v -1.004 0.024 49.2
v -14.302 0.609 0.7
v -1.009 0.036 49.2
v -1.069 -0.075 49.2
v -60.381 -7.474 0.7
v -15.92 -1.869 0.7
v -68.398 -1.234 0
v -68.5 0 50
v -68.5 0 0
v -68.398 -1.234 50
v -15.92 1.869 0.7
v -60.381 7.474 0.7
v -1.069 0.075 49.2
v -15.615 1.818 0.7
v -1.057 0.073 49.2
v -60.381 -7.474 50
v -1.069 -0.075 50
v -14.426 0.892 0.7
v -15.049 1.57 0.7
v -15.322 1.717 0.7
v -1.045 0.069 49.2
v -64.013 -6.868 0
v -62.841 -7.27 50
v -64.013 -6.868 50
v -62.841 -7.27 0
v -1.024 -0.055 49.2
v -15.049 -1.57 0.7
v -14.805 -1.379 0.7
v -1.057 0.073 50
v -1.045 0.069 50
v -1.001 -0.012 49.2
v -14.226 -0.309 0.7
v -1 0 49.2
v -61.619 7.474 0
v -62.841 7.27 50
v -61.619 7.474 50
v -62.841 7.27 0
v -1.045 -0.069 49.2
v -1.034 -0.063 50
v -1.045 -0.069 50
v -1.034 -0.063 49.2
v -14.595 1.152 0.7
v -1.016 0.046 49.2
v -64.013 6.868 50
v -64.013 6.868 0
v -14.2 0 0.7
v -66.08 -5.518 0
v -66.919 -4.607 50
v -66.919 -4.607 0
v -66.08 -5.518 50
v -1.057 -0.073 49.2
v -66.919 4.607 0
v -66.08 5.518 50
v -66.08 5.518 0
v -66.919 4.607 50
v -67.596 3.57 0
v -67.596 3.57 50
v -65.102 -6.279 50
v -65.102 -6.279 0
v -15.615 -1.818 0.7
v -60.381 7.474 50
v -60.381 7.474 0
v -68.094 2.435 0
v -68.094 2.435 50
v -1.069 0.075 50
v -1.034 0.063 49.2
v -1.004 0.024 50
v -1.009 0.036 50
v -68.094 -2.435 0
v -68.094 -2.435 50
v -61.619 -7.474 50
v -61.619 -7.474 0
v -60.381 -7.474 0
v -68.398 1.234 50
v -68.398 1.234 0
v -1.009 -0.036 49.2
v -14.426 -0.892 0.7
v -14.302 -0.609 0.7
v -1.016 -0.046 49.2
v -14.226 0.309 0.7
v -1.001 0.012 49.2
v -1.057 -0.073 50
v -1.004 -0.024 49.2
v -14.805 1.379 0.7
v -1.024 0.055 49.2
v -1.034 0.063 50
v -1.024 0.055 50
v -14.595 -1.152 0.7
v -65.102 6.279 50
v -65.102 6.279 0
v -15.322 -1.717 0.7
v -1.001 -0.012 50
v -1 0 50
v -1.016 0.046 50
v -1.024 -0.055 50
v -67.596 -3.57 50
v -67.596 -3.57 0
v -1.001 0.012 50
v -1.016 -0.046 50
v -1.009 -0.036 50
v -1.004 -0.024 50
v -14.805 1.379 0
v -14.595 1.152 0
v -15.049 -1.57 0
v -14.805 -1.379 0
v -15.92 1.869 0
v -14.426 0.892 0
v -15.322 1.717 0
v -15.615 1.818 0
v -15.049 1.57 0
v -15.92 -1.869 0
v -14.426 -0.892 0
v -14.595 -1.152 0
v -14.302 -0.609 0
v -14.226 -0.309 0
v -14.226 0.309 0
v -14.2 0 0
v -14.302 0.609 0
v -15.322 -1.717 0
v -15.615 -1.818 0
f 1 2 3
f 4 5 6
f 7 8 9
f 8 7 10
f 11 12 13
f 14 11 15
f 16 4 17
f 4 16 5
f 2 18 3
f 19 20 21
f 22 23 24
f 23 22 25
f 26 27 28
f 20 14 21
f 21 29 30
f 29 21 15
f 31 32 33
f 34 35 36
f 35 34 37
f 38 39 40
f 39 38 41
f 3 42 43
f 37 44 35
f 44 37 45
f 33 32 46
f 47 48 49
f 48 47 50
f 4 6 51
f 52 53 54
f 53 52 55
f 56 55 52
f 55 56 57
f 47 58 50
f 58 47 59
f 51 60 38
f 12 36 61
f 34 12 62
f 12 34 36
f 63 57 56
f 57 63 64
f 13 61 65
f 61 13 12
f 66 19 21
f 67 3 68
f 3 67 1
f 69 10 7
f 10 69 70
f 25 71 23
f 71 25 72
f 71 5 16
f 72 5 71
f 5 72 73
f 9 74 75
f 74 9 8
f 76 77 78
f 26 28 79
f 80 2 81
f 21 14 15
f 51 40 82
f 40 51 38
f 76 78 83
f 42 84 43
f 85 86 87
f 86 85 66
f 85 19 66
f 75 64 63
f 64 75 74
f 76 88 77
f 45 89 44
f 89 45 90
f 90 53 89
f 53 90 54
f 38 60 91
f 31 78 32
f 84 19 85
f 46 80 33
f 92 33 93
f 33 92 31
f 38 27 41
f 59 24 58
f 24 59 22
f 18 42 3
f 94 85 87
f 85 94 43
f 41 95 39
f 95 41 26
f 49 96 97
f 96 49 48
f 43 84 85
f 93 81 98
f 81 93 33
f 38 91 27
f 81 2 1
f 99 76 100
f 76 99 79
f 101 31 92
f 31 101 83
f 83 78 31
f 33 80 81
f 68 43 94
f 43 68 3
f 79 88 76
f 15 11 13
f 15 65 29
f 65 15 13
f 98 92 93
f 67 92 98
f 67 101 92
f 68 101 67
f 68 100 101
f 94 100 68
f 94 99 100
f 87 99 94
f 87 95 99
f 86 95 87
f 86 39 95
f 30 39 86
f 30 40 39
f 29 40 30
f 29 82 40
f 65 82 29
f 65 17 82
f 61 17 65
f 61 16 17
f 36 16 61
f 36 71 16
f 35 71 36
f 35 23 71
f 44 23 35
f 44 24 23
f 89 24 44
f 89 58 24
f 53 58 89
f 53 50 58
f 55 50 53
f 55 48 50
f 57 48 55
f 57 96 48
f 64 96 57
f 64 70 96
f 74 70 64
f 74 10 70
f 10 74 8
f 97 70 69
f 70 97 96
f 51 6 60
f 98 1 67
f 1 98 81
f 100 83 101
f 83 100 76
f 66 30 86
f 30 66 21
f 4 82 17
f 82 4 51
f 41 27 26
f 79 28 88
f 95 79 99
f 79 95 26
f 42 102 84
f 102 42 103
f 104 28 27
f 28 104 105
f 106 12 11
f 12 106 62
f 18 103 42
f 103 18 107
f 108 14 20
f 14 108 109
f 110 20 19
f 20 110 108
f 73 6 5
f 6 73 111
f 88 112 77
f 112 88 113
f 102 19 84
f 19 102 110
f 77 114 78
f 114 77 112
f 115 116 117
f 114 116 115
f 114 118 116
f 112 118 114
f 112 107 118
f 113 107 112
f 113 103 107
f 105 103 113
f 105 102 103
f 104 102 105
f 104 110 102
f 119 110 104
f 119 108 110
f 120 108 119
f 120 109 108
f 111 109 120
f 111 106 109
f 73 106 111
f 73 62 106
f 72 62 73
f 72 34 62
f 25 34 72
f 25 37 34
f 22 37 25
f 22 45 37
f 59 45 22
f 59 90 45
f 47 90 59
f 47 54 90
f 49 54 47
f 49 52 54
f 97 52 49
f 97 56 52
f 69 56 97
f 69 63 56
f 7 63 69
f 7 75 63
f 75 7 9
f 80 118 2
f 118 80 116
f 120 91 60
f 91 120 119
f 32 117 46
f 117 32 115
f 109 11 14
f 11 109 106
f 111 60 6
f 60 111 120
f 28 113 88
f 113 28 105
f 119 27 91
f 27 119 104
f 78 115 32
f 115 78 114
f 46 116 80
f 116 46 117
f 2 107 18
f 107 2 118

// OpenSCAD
$fn=38;   


height=50;
spout_troat_from_top=.97;
spout_radious_by_diameter=0.01;
diameter=15;
divisions=1;
wall_thicknesss=.8;
dividers_pullback=2;
 spout_push_out=8;
 
for(xr=[0:14.5:80*0])
   color((rndc()+[1,1,1])*.5)   rotate(xr)
 translate([-spout_push_out*diameter/2-1,0,0]) makecup(height,spout_troat_from_top,spout_radious_by_diameter,diameter,divisions,wall_thicknesss,dividers_pullback,spout_push_out);
 {

}

module makecup(
h=50,
pip=.6,
pipr=.5,
dia=40,
div=5,
wall=1,dividers_pullback,spout_push_out){
 union()
*translate([0,0,h])mirror([0,0,1])   linear_extrude(h*0.15) union(){
rotate(60) translate([-diameter*0.5-wall*2.71,0,0]) 
  offset(-wall*.2)  union(){
    difference(){ union(){
    circle(wall*2);  
    
       rotate(-45) {
          hull(){ square([wall*2,wall*2]); 
        rotate(-15) translate([wall*2,wall*2])   circle(wall*1. );  
        rotate(15) translate([wall*2,wall*2])   circle(wall*1. );  
       }
           }  }
           
    circle(wall*.5);  

    }     }
    ;
   
rotate(-60)  translate([-diameter*0.5-wall*2.71,0,0]){  
   offset( wall*.2)    offset(-wall*.1)    offset(-wall*.1)   difference(){ circle(wall*3);
 circle(wall*2);  
   rotate(60)   square([wall*3,wall*3]); 
   }}}
difference()
{

 connect(h,pip,pipr,dia,div,wall){
translate([0,0,h-wall])linear_extrude(wall)top( h,pip,pipr,dia,div,wall,spout_push_out);
translate([0,0,h*(1-pip)-wall])linear_extrude(wall)bottom(h,pip,pipr,dia,div,wall,spout_push_out);
linear_extrude(wall)bottom(h,pip,pipr,dia,div,wall,spout_push_out);
 }
 
*difference(){
 connect(h,pip,pipr,dia,div,wall){
translate([0,0,h-wall+0.01])linear_extrude(wall)offset(-wall)top(h,pip,pipr,dia,div,wall,spout_push_out);
translate([0,0,h*(1-pip)-wall])linear_extrude(wall)offset(-wall)bottom(h,pip,pipr,dia,div,wall,spout_push_out);
translate([0,0,wall]) linear_extrude(wall)offset(-wall)bottom(h,pip,pipr,dia,div,wall,spout_push_out);
 }
  l=0.9;
linear_extrude(h-dividers_pullback,convexity=100) {

 for (x=[dia/(div
     )*(div%2):dia/(div/2
     ):dia/1.5]){
 hull()
 {
     translate([((-dia/2)),x*l,0]) 
  circle(wall/2);
 
translate([((dia/2)*spout_push_out)-((dia/2)*pipr)*-.5,0,0])  circle(wall/2);
 }
  hull()
 {
     translate([((-dia/2)),-x*l,0]) 
  circle(wall/2);
 
translate([((dia/2)*spout_push_out)-((dia/2)*pipr)*-.5,0,0])  circle(wall/2);
 }
 }}
}

} 
}
module connect(h,pip,pipr,dia,div,wall,spout_push_out)
{
  hull(){
      children(0);
    children(1);
  }
  hull(){
    children(1);
    children(2);
  }
    }




module bottom(h,pip,pipr,dia,div,wall,spout_push_out)
    {
        circle(dia/2);
     translate([((dia/2)*spout_push_out*.75)-((dia/2)*pipr),0,0])   circle((dia/2)*.25);
        
        }

module top(h,pip,pipr,dia,div,wall,spout_push_out){
    
 hull(){ 
    bottom(h,pip,pipr,dia,div,wall,spout_push_out);
    translate([((dia/2)*spout_push_out)-((dia/2)*pipr),0,0])circle((dia/2)*pipr);
   }
    }

  
function rndc()=[rands(0,1,1)[0],rands(0,1,1)[0],rands(0,1,1)[0]];
  function rndR()=rands(-360,360,3) ;
function rnd(a = 1,b = 0,s = []) =
s == []?(rands(min(a,b),max(a,b),1)[0]) :(rands(min(a,b),max(a,b),1,s)[0]);
